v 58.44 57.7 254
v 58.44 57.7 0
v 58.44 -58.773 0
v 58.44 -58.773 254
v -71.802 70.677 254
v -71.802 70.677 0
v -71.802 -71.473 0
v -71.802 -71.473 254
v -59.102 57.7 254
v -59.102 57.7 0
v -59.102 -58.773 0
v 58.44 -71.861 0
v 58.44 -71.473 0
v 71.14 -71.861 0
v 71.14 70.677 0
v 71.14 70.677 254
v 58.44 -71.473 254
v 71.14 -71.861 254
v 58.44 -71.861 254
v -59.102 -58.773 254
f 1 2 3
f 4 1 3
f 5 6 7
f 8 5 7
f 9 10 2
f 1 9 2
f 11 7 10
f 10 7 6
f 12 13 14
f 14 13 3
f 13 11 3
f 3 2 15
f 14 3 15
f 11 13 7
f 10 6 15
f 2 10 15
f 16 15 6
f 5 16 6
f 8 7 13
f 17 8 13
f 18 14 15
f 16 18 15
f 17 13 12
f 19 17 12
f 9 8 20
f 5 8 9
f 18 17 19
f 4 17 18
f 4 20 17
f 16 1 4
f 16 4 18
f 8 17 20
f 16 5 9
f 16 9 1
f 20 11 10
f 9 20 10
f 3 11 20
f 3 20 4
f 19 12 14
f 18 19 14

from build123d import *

# Parameters (mm, degrees)
F0_W     = 117.5417516827
F0_H     = 12.7
F0_H_2   = 12.9770076108
F1_DEPTH = 254


with BuildPart() as f1:
    # F0 (on Top) → F1 (new body)
    with BuildSketch(Plane.XY):
        Polygon((-71.8018082797, 70.6772367408), (-71.8018082797, -71.4734956291), (-59.1018082797, -71.4734956291), (-59.1018082797, -58.7734956291), (-59.1018082797, 57.70022913), (-59.1018082797, 70.6772367408), align=None)
        with Locations((-0.3309324384, -65.1234956291)):
            Rectangle(F0_W, F0_H)
        Polygon((58.439943403, -58.7734956291), (58.439943403, -71.4734956291), (58.439943403, -71.8612532069), (71.139943403, -71.8612532069), (71.139943403, 70.6772367408), (58.439943403, 70.6772367408), (58.439943403, 57.70022913), align=None)
        with Locations((-0.3309324384, 64.1887329354)):
            Rectangle(F0_W, F0_H_2)
    extrude(amount=F1_DEPTH)


solid = f1.part
